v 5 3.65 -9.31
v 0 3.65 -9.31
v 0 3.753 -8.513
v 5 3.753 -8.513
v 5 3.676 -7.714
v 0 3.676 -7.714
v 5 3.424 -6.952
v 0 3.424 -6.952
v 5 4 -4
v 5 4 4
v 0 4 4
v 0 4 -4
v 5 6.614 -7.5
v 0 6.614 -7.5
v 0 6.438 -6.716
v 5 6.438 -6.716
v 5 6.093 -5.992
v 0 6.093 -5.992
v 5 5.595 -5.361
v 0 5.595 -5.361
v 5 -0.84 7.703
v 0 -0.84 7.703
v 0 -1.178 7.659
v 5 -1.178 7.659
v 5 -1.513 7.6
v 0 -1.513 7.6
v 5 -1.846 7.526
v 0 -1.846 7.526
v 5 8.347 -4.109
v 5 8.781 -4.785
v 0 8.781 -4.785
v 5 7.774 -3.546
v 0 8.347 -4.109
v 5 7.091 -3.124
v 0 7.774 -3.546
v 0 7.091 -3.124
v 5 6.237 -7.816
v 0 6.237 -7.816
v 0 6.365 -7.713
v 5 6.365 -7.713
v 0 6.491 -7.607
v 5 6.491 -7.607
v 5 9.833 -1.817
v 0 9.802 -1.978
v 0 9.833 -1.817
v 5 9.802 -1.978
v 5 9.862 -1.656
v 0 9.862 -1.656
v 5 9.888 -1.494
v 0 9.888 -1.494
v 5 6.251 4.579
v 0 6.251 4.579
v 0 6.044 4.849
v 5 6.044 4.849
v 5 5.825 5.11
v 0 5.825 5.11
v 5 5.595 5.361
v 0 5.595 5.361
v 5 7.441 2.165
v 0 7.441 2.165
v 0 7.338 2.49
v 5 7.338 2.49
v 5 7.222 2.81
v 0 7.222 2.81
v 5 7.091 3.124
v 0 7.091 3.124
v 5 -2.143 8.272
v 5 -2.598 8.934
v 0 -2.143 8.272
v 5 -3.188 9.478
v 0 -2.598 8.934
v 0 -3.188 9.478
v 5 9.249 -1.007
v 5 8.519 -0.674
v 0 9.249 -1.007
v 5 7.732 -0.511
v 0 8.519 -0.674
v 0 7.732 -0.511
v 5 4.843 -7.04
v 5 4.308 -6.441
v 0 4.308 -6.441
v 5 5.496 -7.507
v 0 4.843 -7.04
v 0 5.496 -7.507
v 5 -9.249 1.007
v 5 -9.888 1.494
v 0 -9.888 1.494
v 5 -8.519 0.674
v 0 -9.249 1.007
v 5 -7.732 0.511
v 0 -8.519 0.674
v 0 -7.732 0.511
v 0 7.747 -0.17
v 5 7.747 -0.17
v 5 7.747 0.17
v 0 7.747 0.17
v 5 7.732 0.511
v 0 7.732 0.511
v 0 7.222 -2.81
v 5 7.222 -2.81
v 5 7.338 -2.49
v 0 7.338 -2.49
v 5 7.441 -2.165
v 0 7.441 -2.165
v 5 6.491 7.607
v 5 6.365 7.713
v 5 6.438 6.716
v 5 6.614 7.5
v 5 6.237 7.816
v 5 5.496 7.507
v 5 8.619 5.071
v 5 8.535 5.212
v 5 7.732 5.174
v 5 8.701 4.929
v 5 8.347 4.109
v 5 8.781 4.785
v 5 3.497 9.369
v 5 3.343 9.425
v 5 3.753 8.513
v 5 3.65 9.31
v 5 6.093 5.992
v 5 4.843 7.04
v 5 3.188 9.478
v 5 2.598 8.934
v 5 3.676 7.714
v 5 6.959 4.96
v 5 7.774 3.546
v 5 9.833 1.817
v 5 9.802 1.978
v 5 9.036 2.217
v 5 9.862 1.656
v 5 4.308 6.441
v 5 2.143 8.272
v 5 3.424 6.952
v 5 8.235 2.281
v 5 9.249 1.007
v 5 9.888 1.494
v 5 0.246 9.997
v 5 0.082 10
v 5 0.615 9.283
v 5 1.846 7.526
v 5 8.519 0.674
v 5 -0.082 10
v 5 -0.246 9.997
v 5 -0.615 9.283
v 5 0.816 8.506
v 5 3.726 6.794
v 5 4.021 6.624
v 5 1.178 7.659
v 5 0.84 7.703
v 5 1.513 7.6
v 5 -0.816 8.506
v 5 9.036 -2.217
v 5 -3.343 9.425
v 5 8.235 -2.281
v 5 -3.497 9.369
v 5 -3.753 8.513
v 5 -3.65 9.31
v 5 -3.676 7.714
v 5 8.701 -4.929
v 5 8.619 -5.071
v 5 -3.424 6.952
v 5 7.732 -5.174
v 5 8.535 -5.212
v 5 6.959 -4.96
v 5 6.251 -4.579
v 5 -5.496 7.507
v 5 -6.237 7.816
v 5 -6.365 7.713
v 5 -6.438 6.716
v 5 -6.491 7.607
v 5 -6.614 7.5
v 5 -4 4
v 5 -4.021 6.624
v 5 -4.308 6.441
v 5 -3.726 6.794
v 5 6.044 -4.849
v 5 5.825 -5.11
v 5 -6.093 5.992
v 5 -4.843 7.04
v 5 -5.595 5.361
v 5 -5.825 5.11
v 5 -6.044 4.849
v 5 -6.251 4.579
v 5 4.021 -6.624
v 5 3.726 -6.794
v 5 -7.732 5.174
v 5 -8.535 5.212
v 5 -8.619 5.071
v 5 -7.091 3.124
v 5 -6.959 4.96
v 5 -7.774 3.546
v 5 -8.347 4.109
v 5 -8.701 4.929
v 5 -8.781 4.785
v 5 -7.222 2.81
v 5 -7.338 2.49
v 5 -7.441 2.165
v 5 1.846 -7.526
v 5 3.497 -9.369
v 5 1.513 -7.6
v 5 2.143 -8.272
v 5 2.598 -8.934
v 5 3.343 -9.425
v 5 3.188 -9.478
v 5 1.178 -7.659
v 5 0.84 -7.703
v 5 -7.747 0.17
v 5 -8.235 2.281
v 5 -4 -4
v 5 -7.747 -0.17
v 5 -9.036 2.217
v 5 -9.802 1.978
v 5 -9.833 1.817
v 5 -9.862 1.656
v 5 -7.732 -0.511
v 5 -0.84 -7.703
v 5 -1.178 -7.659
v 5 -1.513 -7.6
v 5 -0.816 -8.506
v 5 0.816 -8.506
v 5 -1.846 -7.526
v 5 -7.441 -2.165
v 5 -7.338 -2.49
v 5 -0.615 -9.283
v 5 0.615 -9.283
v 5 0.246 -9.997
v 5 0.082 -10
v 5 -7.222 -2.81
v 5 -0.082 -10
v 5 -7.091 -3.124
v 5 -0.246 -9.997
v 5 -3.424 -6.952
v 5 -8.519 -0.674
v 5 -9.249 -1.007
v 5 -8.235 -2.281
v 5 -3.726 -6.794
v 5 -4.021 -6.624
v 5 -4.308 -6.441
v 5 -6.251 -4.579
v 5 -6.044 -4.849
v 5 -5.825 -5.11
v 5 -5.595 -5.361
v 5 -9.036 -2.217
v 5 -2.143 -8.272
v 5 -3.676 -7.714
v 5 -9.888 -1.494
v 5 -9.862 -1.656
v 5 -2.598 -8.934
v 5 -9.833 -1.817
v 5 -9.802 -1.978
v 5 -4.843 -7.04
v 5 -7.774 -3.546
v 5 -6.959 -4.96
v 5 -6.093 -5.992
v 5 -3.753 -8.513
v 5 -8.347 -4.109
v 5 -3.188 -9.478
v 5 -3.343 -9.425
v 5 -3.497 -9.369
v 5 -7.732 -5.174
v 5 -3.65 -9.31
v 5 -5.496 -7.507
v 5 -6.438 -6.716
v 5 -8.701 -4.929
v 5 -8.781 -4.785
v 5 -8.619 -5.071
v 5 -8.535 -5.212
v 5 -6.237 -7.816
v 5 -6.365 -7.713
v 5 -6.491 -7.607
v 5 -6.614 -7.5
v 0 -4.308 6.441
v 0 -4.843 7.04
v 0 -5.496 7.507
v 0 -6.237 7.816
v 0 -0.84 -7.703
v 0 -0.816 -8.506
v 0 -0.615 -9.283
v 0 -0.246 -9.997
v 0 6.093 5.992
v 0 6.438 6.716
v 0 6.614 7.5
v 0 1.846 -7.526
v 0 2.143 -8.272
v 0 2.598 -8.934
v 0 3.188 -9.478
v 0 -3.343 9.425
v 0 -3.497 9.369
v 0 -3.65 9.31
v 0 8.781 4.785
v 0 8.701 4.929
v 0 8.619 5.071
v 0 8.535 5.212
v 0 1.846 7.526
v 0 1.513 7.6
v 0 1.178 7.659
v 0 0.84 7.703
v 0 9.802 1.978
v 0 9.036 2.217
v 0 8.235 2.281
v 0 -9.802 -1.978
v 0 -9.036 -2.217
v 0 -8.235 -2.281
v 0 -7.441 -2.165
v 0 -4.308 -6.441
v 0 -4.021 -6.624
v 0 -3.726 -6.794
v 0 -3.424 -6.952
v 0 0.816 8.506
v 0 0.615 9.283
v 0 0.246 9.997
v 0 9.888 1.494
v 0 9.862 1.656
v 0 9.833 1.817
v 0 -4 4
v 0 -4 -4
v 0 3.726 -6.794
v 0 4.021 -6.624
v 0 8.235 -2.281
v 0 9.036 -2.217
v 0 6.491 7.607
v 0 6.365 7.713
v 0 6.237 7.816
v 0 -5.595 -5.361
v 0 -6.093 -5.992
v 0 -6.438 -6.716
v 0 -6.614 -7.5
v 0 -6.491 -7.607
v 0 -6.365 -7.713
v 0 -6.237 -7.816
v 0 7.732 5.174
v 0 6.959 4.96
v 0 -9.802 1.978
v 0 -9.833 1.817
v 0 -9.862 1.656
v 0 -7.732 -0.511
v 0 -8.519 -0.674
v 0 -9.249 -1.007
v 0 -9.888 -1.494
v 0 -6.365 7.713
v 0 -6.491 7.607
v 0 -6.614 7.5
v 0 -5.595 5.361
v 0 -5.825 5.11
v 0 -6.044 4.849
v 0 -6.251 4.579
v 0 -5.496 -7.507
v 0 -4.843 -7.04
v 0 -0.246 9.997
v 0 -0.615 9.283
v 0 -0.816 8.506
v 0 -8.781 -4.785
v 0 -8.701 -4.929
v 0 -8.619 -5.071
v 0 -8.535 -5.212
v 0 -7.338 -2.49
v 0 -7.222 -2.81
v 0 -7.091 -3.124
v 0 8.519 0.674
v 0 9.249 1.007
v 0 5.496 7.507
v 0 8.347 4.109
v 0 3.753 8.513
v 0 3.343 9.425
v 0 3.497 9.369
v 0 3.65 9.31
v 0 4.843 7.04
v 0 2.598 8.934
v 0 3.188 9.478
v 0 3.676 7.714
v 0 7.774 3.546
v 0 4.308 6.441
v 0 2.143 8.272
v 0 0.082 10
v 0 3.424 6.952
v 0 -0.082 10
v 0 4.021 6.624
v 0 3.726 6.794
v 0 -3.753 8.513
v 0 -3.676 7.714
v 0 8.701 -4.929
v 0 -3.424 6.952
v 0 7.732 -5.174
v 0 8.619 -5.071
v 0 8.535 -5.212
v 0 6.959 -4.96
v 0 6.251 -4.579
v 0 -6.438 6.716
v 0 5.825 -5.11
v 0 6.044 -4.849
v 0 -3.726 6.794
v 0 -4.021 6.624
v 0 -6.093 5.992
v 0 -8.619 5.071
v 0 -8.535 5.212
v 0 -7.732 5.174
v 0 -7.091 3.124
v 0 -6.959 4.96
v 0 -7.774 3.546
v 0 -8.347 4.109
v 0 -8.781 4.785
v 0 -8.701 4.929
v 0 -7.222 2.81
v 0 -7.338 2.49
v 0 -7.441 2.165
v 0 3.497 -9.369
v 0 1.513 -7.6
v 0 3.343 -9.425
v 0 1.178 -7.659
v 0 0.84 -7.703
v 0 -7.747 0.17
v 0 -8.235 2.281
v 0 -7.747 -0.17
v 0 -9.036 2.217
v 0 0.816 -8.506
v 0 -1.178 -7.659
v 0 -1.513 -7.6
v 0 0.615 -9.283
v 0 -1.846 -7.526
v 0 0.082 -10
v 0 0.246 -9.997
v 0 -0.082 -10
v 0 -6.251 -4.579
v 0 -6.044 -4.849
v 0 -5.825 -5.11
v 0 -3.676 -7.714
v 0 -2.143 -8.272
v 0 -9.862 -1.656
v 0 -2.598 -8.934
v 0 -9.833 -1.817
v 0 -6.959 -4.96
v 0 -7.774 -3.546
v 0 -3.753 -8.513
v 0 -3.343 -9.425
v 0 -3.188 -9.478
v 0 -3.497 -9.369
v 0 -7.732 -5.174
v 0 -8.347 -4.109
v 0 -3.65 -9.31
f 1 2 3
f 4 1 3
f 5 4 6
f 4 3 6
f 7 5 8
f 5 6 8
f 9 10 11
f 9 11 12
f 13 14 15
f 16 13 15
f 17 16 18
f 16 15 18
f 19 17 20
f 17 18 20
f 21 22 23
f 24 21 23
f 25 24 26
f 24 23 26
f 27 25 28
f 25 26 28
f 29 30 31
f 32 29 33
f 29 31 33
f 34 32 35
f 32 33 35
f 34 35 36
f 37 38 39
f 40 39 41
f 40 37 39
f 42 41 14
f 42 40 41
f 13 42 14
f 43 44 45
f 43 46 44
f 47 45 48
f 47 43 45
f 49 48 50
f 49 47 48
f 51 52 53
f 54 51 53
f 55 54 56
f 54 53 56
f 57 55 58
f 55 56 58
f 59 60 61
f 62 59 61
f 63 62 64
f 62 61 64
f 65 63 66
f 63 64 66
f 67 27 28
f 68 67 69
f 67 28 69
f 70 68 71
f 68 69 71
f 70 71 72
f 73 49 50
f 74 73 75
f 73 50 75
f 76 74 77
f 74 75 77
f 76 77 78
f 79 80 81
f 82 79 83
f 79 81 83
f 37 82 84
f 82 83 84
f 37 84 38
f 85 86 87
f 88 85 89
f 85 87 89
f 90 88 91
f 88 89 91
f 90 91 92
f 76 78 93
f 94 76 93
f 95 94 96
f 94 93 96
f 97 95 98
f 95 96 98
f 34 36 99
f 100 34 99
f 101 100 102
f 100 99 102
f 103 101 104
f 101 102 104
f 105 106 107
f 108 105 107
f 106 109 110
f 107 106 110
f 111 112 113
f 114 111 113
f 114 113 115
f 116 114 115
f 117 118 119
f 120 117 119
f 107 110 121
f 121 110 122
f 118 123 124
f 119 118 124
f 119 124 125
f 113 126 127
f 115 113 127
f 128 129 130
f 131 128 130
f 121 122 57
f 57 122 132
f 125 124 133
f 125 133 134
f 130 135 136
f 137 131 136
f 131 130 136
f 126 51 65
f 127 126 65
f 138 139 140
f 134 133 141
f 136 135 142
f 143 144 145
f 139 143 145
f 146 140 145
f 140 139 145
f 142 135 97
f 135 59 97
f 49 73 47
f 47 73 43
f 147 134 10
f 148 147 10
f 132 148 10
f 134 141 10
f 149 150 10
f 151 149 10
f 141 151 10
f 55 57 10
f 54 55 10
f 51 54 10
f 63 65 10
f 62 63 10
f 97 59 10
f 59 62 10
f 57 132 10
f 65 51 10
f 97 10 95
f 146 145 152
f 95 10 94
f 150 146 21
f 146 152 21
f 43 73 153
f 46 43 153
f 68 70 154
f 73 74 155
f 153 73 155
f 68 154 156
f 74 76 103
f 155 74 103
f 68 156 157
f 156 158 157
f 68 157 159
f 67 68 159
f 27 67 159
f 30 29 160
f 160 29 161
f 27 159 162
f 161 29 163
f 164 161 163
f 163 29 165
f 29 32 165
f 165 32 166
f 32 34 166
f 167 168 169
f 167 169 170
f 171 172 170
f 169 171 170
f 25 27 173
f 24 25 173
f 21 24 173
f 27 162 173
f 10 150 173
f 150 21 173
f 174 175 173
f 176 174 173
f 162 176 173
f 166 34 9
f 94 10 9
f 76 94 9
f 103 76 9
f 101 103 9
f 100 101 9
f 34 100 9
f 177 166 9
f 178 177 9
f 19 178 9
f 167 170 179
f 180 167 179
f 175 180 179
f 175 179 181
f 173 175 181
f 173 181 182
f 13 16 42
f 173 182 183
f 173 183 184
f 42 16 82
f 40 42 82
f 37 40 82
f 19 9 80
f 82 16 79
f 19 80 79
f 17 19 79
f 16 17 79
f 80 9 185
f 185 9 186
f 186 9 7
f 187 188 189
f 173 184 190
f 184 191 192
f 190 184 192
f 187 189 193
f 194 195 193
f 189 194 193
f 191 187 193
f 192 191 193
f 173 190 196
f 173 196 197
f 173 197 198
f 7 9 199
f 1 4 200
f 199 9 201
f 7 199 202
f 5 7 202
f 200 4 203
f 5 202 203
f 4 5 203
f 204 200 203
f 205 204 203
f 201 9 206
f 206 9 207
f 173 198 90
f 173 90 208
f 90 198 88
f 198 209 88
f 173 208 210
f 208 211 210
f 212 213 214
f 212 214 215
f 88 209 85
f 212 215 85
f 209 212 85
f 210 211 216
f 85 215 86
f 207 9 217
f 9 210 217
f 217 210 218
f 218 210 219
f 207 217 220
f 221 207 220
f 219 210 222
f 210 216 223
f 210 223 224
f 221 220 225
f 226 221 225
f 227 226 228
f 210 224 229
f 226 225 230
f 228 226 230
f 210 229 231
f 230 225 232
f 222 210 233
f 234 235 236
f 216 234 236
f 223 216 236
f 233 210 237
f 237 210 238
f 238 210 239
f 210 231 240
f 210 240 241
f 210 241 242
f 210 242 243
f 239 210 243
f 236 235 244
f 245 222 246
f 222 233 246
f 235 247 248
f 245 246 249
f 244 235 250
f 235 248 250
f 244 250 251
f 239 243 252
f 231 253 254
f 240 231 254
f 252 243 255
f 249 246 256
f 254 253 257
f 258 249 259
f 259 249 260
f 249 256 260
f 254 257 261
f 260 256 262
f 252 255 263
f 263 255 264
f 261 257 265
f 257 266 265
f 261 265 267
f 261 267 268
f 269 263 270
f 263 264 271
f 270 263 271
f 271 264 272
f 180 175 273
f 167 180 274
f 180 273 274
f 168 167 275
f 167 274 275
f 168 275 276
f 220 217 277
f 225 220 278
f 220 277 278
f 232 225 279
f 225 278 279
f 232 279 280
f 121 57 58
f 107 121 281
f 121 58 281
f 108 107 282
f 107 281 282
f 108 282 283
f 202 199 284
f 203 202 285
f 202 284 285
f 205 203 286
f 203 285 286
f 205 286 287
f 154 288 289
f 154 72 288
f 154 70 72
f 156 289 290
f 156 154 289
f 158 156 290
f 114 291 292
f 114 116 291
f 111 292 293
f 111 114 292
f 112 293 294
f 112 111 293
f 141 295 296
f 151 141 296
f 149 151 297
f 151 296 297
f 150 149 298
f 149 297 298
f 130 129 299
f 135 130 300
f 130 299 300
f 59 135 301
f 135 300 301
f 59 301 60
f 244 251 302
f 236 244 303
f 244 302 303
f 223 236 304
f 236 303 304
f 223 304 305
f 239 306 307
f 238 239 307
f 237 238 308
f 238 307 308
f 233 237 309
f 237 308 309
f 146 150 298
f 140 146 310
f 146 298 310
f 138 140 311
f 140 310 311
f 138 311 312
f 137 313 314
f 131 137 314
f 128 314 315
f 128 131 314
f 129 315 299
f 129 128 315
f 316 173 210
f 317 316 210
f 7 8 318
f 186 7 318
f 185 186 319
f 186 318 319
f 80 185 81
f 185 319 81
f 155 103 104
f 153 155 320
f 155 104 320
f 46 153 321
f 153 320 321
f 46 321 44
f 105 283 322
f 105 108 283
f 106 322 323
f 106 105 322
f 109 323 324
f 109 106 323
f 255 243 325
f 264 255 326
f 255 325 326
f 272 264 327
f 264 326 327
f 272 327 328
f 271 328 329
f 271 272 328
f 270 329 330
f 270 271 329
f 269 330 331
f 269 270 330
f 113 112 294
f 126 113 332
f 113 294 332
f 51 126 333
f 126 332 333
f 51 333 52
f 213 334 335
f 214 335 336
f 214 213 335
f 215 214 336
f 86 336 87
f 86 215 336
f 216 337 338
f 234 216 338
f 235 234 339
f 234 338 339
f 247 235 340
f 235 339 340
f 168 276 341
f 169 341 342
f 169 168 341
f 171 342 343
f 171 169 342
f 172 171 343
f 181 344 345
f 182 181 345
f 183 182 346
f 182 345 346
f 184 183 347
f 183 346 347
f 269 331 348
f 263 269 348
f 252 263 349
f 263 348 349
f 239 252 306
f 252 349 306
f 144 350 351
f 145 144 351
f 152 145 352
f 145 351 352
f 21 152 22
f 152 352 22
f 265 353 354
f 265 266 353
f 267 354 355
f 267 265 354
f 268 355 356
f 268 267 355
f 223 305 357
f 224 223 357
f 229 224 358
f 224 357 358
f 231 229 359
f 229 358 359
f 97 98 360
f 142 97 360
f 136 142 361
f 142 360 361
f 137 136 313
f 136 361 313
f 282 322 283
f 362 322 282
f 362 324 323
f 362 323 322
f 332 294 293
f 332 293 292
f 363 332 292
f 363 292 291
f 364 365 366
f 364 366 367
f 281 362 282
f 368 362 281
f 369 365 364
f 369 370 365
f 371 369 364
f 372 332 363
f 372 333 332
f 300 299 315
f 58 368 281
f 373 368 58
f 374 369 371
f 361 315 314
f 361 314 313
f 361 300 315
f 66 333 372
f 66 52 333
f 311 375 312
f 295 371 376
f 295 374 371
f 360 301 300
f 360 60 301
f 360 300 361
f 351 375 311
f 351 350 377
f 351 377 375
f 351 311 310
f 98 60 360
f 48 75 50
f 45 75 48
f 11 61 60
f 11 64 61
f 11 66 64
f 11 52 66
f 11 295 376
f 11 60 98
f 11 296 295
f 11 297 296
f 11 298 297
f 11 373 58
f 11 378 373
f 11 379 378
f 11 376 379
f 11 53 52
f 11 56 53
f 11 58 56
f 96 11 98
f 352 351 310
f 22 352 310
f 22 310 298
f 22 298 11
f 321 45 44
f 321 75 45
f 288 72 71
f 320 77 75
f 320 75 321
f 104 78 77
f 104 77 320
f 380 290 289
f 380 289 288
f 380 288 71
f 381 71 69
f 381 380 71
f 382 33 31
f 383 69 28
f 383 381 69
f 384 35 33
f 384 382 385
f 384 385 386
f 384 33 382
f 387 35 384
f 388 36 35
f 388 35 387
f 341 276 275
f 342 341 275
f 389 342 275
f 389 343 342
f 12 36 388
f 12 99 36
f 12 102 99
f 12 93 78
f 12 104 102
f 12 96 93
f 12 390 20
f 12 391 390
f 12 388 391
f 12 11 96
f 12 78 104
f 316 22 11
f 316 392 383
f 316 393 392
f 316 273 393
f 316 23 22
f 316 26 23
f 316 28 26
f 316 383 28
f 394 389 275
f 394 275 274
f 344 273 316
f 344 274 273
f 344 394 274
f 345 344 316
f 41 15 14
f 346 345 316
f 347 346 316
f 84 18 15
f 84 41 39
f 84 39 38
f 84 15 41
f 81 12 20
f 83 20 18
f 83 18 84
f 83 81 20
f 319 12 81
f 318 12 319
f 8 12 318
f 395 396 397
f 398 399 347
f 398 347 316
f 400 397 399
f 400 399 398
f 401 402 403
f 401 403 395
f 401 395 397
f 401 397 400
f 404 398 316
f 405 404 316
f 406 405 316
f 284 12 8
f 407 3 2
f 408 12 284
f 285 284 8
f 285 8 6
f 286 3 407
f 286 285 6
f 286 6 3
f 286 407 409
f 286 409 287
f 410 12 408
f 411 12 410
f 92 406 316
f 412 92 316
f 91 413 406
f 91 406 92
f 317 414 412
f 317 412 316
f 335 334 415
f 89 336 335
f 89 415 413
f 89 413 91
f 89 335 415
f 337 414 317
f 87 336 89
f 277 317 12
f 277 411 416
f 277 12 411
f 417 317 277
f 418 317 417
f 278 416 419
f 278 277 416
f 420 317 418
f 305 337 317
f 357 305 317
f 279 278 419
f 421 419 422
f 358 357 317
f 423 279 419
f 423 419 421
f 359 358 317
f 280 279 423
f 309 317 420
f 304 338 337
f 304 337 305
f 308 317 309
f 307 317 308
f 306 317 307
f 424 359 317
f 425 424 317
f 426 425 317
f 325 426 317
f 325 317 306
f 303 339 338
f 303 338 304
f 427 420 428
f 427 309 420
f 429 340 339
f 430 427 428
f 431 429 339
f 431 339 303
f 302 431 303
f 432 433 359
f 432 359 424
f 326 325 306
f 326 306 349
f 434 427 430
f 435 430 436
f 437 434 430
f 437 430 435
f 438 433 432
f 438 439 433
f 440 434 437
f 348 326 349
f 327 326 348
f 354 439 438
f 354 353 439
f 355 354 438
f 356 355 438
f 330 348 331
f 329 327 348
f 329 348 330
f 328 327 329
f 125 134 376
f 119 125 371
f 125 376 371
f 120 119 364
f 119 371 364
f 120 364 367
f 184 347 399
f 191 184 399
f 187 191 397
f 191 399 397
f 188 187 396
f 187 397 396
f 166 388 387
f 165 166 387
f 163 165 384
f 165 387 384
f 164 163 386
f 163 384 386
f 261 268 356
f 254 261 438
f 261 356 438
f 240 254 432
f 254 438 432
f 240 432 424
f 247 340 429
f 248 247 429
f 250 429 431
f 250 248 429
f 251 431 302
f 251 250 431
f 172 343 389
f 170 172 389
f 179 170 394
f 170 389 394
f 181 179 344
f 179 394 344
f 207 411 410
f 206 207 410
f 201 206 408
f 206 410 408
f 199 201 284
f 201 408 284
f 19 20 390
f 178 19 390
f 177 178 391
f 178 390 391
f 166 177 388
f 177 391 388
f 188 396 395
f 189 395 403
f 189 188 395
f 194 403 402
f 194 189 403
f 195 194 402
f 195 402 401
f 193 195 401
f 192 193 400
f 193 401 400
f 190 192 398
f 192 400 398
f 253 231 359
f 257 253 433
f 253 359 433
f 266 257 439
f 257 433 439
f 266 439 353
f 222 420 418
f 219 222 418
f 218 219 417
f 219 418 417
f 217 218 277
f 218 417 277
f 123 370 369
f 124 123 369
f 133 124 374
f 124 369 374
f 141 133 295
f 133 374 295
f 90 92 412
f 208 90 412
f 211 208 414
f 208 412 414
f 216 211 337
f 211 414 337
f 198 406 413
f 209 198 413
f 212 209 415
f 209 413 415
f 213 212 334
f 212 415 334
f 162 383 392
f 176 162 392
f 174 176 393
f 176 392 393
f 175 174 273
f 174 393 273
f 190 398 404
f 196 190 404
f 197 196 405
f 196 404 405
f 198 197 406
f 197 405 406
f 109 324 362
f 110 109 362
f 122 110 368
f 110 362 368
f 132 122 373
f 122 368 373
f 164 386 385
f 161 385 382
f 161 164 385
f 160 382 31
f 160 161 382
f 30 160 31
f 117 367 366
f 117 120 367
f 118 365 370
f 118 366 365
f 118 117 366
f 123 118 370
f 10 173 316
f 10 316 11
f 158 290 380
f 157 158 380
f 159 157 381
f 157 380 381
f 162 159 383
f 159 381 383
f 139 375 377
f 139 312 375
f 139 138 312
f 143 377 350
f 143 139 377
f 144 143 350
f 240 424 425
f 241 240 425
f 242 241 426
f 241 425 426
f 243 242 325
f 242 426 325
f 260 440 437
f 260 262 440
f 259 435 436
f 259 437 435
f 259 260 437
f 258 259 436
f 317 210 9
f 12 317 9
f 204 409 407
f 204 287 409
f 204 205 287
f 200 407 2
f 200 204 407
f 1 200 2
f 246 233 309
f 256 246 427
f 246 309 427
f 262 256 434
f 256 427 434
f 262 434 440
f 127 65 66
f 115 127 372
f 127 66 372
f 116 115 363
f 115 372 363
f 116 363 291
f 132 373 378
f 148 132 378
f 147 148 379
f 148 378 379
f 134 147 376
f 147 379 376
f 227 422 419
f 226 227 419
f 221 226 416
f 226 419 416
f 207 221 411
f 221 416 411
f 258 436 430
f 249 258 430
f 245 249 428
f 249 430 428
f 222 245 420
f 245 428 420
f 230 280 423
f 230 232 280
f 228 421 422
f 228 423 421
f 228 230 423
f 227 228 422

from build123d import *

# Parameters (mm, degrees)
BASPROSKE_W        = 5
BASPROSKE_H        = 10
TOOTHCUT_DEPTH     = 16
TEETHCUTS_COUNT    = 18
TEETHCUTS_ANGLE    = 340
BORSKE_R           = 2.5
BORE_DEPTH         = 50.0000508
SKETCH1_W          = 8
SKETCH1_H          = 8
CUT_EXTRUDE1_DEPTH = 15.925454152


with BuildPart() as part:
    # BasProSke → Base-Revolve (revolve)
    with BuildSketch(Plane(origin=(0, 0, 0), x_dir=(1, 0, 0), z_dir=(0, 1, 0)), mode=Mode.PRIVATE) as base_revolve_sk:
        with Locations((2.5, 5)):
            Rectangle(BASPROSKE_W, BASPROSKE_H)
    revolve(base_revolve_sk.sketch.rotate(Axis((-10, 0, 0), (1, 0, 0)), 180), axis=Axis((-10, 0, 0), (1, 0, 0)))

    # TooCutSke → ToothCut (cut, through all)
    with BuildSketch(Plane(origin=(0, 0, 0), x_dir=(0, 0, -1), z_dir=(1, 0, 0))):
        with BuildLine():
            ThreePointArc((0.510641536, 7.732156635), (0, 7.749), (-0.510641536, 7.732156635))
            ThreePointArc((-0.510641536, 7.732156635), (-0.82619259, 8.907320741), (-1.515208602, 9.910236529))
            ThreePointArc((-1.515208602, 9.910236529), (0, 10.0254), (1.515208602, 9.910236529))
            ThreePointArc((1.515208602, 9.910236529), (0.82619259, 8.907320741), (0.510641536, 7.732156635))
        make_face()
    toothcut = extrude(amount=TOOTHCUT_DEPTH, mode=Mode.SUBTRACT)

    # TeethCuts: ToothCut ×18 about axis
    teethcuts_axis = Axis((-10, 0, 0), (1, 0, 0))
    for i in range(1, TEETHCUTS_COUNT):
        add(toothcut.rotate(teethcuts_axis, i * TEETHCUTS_ANGLE / (TEETHCUTS_COUNT - 1)), mode=Mode.SUBTRACT)

    # BorSke → Bore (cut, symmetric)
    with BuildSketch(Plane(origin=(0, 0, 0), x_dir=(0, 0, -1), z_dir=(1, 0, 0))):
        with Locations(Location((0, 0, 0), (0, 0, 180))):
            Circle(BORSKE_R)
    extrude(amount=BORE_DEPTH, both=True, mode=Mode.SUBTRACT)

    # Sketch1 → Cut-Extrude1 (cut, through all)
    with BuildSketch(Plane(origin=(5, 0, 0), x_dir=(0, 0, -1), z_dir=(1, 0, 0))):
        Rectangle(SKETCH1_W, SKETCH1_H)
    extrude(amount=-CUT_EXTRUDE1_DEPTH, mode=Mode.SUBTRACT)


solid = part.part
